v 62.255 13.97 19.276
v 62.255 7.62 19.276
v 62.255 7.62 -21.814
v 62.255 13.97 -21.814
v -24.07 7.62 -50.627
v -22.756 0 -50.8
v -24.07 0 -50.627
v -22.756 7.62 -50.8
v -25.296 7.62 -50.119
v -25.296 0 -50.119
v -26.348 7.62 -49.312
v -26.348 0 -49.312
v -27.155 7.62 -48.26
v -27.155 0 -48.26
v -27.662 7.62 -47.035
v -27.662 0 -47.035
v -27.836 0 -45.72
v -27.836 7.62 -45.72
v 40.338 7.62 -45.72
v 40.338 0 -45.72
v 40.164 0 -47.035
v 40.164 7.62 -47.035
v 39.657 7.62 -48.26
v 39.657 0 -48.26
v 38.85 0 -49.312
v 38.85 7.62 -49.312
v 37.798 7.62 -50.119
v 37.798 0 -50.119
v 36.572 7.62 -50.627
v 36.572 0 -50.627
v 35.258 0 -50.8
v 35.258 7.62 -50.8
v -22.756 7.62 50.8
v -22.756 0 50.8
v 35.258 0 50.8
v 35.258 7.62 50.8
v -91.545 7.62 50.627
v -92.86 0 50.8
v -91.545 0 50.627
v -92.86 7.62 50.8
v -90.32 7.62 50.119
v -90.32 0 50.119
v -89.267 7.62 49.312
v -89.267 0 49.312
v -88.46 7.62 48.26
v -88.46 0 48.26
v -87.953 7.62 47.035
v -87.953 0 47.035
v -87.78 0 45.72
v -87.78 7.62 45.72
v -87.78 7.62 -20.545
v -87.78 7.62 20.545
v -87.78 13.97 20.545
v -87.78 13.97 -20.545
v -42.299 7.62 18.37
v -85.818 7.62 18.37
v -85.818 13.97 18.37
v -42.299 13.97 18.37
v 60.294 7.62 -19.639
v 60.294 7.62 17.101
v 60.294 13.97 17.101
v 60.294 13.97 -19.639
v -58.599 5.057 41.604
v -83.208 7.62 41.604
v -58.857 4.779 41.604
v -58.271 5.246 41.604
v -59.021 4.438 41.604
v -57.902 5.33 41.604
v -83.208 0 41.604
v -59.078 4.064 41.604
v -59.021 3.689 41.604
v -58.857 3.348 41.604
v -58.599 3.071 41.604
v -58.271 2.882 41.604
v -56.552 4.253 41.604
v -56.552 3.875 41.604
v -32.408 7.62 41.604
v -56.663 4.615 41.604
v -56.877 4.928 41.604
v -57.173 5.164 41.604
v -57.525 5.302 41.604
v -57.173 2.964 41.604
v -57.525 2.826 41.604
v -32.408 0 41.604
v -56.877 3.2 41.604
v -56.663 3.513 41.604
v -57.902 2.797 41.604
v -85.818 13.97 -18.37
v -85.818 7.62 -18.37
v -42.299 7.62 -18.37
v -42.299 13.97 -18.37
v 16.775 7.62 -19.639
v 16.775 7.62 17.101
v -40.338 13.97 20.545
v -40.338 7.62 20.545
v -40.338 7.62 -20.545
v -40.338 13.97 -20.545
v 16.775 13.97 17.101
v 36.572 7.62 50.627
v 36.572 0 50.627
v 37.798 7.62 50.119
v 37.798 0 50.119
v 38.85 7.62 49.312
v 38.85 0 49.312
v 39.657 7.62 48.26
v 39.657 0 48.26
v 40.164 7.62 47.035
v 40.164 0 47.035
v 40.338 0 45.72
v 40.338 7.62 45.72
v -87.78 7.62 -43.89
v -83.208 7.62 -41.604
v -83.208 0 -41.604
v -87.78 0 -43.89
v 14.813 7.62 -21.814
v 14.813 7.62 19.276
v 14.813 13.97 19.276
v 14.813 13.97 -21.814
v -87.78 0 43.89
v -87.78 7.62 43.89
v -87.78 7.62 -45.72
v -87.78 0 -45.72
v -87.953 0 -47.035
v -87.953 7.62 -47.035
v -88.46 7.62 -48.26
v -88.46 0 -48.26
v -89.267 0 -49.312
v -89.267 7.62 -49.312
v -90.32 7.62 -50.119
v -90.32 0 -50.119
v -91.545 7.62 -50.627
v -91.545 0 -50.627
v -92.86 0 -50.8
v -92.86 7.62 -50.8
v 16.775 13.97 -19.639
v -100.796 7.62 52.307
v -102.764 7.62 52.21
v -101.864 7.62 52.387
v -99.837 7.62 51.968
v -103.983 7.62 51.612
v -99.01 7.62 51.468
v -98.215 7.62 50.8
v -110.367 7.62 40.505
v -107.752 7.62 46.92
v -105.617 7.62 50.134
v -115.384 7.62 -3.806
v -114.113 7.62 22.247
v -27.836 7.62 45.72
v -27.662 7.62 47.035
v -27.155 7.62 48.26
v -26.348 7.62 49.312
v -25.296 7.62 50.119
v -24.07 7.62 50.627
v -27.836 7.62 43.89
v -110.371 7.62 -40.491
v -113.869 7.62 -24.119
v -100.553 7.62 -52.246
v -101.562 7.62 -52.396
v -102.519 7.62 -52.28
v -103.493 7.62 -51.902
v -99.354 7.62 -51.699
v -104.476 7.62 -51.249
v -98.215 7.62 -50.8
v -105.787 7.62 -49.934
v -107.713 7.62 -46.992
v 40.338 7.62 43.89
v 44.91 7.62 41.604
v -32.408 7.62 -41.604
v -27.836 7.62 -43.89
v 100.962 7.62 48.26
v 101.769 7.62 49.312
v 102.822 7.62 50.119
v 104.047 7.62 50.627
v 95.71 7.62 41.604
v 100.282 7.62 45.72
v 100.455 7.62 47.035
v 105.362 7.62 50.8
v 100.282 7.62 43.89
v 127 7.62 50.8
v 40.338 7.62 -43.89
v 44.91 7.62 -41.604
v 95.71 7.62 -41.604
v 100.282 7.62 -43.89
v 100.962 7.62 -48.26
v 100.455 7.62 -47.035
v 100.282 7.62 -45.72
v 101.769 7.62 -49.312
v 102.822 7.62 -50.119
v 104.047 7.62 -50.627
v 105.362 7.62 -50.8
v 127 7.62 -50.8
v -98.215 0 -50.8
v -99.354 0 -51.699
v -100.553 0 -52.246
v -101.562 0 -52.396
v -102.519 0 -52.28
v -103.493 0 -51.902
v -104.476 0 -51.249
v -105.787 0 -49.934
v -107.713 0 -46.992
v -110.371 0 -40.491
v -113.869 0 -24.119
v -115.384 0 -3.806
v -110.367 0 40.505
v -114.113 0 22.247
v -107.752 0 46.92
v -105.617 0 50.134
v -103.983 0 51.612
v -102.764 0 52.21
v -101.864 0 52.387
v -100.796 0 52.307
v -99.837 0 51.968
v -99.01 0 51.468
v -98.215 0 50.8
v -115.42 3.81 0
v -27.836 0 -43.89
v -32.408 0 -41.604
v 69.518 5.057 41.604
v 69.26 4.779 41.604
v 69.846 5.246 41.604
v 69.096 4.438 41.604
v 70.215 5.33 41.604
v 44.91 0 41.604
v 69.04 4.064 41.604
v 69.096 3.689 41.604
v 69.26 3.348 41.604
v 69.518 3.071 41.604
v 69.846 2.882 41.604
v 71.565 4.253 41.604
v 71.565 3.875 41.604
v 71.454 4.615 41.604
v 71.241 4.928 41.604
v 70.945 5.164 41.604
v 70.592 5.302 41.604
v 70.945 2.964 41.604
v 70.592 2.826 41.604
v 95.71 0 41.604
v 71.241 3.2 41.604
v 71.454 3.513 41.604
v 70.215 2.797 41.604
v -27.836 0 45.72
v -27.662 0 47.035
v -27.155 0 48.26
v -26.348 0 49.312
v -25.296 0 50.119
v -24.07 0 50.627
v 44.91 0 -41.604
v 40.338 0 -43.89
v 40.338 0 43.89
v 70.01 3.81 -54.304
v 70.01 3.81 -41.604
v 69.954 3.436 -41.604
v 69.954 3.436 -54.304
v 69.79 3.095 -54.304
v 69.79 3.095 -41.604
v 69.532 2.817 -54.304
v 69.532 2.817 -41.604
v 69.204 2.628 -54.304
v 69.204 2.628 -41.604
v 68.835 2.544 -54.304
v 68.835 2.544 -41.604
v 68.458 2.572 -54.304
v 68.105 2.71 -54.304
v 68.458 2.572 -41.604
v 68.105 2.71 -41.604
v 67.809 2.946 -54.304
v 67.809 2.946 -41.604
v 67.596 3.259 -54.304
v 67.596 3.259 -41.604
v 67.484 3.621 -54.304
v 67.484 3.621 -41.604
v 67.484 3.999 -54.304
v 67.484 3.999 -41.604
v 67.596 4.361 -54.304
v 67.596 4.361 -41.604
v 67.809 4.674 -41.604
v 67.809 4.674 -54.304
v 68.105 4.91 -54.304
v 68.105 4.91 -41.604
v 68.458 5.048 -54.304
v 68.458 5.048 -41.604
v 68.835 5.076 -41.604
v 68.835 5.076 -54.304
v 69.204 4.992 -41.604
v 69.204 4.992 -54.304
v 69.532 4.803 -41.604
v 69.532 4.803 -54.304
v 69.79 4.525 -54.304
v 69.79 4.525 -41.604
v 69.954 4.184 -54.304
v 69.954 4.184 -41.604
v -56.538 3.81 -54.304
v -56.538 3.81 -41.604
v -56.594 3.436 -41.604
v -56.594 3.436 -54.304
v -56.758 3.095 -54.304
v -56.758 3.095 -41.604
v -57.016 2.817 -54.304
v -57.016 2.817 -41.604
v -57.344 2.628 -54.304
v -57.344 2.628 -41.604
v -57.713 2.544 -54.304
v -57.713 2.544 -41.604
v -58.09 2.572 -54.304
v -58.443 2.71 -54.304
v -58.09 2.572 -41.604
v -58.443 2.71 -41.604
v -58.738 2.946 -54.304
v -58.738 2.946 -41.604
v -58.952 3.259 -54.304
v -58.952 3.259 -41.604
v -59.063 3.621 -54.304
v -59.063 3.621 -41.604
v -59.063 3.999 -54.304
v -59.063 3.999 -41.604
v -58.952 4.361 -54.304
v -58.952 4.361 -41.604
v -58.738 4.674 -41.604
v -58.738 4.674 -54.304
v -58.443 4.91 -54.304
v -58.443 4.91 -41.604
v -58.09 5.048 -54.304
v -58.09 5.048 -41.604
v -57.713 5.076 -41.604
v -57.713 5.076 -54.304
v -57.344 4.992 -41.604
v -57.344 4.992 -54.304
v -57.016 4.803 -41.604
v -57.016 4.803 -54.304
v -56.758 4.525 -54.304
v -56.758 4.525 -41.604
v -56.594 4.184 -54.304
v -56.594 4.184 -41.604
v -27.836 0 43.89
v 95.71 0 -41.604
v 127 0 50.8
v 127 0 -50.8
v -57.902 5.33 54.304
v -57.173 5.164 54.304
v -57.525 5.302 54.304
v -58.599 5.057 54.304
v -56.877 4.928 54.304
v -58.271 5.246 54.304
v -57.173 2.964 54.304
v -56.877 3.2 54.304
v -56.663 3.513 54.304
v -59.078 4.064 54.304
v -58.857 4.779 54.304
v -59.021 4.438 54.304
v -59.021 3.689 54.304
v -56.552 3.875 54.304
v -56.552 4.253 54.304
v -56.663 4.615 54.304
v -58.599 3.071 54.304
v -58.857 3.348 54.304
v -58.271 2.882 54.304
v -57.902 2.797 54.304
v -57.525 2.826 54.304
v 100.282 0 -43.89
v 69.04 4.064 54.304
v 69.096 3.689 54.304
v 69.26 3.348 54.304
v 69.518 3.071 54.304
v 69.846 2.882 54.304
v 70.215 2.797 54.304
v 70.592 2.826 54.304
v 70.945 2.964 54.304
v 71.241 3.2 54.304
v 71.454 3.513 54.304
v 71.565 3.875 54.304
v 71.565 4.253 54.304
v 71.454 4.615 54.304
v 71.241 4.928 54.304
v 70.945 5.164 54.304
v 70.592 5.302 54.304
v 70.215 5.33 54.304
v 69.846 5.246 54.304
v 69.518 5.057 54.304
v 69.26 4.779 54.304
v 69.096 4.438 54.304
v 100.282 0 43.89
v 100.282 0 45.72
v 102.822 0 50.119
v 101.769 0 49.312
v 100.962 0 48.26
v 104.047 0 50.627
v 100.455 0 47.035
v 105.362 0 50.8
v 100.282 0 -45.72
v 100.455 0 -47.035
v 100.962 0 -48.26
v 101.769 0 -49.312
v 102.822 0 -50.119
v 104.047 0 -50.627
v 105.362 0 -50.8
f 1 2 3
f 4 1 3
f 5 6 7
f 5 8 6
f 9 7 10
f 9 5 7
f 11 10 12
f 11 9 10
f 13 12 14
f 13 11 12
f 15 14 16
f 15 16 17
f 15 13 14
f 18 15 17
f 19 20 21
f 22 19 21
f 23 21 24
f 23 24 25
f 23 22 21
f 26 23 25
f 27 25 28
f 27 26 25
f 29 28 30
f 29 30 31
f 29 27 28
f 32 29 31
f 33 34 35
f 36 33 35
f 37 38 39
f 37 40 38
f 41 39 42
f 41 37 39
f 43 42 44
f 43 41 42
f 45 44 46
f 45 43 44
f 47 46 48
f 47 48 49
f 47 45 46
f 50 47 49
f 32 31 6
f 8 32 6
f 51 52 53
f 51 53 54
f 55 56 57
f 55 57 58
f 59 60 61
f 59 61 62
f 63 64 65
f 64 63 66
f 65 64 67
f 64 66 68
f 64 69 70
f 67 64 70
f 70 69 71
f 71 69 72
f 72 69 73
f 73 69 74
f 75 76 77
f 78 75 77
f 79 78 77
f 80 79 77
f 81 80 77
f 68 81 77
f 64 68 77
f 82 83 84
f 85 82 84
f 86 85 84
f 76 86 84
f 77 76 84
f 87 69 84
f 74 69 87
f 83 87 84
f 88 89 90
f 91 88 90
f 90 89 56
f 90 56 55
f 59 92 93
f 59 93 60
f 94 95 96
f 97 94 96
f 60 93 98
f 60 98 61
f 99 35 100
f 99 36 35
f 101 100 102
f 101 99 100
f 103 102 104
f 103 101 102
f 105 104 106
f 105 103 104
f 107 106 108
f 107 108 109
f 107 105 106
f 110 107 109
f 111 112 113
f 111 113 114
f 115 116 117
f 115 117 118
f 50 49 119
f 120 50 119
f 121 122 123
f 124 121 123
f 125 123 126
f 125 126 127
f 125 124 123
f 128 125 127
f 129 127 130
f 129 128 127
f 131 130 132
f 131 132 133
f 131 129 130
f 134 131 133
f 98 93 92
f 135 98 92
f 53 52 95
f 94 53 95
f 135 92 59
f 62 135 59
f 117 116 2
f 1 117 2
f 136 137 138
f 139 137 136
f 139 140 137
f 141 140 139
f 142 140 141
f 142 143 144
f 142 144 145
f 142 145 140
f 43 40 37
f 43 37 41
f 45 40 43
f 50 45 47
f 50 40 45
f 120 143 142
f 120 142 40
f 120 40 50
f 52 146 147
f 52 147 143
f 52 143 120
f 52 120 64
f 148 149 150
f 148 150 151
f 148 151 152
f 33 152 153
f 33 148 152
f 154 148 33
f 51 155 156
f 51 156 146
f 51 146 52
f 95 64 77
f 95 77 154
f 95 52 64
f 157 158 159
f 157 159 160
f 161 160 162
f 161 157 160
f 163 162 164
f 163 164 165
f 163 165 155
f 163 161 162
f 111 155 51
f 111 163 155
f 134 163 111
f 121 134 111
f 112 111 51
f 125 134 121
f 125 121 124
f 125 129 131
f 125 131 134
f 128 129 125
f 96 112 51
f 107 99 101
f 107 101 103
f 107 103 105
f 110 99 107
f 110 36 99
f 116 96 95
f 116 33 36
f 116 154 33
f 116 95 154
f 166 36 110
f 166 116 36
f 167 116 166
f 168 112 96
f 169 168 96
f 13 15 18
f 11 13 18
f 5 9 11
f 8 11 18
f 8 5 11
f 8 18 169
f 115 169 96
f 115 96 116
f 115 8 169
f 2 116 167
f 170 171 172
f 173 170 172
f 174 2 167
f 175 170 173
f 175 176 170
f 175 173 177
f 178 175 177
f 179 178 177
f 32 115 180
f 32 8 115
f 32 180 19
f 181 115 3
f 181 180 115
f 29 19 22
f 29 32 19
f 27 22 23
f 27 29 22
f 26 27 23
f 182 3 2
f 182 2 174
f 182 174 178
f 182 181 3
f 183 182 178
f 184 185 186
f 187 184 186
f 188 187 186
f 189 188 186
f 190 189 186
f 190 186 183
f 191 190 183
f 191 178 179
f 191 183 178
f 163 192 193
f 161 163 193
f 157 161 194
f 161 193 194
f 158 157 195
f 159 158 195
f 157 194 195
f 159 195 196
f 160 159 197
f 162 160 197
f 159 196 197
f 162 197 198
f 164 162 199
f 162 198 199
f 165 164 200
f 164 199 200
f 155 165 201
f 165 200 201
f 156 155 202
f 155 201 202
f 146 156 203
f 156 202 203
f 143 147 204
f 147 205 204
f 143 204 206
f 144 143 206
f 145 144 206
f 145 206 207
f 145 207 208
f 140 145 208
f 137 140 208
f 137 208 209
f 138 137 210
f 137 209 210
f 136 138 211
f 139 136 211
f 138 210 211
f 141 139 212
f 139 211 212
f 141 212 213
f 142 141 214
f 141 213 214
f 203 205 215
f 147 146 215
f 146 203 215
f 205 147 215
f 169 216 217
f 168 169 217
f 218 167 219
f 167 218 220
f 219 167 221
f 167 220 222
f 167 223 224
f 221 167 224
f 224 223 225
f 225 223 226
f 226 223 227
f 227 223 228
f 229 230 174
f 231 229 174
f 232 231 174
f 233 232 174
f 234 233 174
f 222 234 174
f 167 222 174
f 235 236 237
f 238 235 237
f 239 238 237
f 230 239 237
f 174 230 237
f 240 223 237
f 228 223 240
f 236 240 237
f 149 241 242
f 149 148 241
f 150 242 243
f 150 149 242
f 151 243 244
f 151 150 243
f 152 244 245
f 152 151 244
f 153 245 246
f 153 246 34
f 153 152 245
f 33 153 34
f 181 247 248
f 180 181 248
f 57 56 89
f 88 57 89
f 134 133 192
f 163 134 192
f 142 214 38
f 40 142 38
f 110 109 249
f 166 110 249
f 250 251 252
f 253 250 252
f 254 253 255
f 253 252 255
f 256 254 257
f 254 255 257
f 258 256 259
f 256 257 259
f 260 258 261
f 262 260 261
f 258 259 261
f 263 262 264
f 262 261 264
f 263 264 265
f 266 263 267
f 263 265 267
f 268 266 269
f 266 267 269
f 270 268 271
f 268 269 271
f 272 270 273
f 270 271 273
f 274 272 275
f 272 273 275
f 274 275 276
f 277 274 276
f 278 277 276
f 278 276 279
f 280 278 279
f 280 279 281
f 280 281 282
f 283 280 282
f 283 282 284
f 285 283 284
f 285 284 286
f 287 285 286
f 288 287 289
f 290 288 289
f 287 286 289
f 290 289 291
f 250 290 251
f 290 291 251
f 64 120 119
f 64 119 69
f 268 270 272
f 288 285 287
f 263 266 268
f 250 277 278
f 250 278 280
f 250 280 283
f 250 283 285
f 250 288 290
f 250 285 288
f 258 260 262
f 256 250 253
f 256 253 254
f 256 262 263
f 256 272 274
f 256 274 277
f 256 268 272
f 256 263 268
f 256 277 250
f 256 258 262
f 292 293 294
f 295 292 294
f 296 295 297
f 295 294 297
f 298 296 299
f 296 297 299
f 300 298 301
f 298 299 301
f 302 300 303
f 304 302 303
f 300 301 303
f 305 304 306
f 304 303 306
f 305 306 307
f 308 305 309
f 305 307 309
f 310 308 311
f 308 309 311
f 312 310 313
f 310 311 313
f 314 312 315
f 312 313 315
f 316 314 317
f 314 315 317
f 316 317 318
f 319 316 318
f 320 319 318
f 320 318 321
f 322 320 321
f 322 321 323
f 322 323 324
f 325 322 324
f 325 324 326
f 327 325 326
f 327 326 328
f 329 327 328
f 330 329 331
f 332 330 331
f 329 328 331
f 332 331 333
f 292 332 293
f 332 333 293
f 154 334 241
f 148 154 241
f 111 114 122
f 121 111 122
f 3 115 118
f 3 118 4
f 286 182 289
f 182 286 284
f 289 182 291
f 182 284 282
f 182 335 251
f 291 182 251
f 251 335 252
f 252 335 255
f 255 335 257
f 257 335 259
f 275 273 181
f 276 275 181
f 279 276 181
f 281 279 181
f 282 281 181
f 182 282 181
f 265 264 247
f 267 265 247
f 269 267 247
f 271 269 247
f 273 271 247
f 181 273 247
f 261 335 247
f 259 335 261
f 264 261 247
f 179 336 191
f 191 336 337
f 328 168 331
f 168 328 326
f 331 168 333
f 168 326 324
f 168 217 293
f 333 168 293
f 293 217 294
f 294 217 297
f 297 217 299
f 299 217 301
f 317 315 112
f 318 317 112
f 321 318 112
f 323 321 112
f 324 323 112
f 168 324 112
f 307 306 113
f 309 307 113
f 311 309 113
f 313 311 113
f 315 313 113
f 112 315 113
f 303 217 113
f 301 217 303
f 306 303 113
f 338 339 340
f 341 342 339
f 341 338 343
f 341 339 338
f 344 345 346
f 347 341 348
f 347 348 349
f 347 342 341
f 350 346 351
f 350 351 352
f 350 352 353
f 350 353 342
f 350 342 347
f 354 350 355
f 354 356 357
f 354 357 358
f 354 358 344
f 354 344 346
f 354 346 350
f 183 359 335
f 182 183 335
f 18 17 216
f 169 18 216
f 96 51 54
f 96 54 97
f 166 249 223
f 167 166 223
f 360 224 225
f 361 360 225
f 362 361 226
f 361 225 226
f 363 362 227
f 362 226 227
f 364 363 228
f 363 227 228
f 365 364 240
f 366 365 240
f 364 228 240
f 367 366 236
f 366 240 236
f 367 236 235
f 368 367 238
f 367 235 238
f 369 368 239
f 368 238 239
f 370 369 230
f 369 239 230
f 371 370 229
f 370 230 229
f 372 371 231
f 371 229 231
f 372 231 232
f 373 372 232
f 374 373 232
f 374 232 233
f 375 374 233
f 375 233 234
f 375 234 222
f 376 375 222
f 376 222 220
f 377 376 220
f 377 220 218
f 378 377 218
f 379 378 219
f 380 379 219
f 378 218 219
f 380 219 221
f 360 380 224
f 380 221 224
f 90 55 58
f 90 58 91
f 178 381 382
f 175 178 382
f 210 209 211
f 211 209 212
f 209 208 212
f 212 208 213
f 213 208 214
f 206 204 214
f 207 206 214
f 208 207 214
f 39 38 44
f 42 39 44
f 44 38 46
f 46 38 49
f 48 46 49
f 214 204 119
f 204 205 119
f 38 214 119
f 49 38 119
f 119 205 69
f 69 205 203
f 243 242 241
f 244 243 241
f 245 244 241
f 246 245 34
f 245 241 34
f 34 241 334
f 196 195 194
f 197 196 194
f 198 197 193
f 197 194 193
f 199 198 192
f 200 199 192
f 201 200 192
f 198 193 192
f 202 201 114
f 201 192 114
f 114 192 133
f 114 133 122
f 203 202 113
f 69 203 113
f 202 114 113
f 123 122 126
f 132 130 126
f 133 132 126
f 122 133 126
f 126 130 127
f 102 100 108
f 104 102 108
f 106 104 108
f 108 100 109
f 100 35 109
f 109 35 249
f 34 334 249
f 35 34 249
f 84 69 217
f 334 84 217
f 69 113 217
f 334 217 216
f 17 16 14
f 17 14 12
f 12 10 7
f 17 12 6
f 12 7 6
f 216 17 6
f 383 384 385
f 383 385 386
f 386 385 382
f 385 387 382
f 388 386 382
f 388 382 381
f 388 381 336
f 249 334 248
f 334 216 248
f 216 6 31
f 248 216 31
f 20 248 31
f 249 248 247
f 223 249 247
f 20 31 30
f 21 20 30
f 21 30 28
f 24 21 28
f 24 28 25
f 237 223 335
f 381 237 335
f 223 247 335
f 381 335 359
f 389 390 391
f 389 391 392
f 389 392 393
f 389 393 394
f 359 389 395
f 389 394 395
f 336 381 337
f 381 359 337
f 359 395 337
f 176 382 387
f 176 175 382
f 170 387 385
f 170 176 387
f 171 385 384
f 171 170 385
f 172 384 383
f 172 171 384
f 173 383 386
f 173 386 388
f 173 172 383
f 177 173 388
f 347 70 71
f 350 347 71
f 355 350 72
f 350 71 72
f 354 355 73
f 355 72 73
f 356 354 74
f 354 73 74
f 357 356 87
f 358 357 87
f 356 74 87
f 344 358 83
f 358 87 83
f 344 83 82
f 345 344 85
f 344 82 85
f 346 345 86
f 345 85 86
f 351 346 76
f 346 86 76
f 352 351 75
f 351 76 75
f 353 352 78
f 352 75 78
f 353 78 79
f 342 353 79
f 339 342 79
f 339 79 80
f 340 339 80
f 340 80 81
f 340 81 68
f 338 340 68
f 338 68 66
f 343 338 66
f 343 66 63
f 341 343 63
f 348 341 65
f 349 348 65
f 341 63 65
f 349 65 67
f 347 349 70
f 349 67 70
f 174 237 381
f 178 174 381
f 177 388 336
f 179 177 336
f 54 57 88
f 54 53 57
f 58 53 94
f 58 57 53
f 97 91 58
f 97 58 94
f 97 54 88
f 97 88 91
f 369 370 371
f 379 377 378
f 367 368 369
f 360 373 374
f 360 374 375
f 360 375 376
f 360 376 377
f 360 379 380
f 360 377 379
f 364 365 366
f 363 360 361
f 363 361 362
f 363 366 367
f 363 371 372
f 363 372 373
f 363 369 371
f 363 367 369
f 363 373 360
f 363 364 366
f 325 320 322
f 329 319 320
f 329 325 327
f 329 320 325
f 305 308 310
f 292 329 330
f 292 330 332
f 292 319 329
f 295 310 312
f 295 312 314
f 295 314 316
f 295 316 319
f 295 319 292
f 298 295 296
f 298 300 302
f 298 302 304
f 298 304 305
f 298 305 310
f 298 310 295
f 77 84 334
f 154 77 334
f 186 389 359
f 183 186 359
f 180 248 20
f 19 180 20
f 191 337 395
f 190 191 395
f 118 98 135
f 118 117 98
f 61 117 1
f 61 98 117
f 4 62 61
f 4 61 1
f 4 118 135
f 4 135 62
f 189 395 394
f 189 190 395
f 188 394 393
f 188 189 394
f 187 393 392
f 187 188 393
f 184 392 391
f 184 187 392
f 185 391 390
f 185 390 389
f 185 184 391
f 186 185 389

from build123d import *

# Parameters (mm, degrees)
BOSS_EXTRUDE1_DEPTH = 7.62
SKETCH3_R           = 1.27
BOSS_EXTRUDE4_DEPTH = 12.7
SKETCH4_R           = 1.27
BOSS_EXTRUDE5_DEPTH = 12.7
SKETCH5_W           = 47.441949355
SKETCH5_H           = 41.090366136
SKETCH5_W_2         = 43.519244155
SKETCH5_H_2         = 36.739621486
BOSS_EXTRUDE7_DEPTH = 6.35
FILLET12_R          = 5.08


with BuildPart() as part:
    # Sketch1 → Boss-Extrude1 (new body)
    with BuildSketch(Plane(origin=(0, 0, 0), x_dir=(1, 0, 0), z_dir=(0, 1, 0))):
        with BuildLine():
            Line((-87.779503071, 43.889751536), (-87.779503071, 50.8))
            Line((-87.779503071, 50.8), (-98.214639932, 50.8))
            add(Edge.make_bspline(
                [(-98.214639932, 50.8), (-115.420496929, 67.280501768), (-115.420496929, 0), (-115.420496929, -67.280501768), (-98.214639932, -50.8)],
                knots=[2.894122342, 2.894122342, 2.894122342, 4.71238898, 4.71238898, 6.530655618, 6.530655618, 6.530655618], degree=2, weights=[1, 0.614429767, 1, 0.614429767, 1]))
            Line((-98.214639932, -50.8), (-87.779503071, -50.8))
            Line((-87.779503071, -50.8), (-87.779503071, -43.889751536))
            Line((-87.779503071, -43.889751536), (-83.207503071, -41.603751536))
            Line((-83.207503071, -41.603751536), (-32.407503071, -41.603751536))
            Line((-32.407503071, -41.603751536), (-27.835503071, -43.889751536))
            Line((-27.835503071, -43.889751536), (-27.835503071, -50.8))
            Line((-27.835503071, -50.8), (40.337553716, -50.8))
            Line((40.337553716, -50.8), (40.337553716, -43.889751536))
            Line((40.337553716, -43.889751536), (44.909553716, -41.603751536))
            Line((44.909553716, -41.603751536), (95.709553716, -41.603751536))
            Line((95.709553716, -41.603751536), (100.281553716, -43.889751536))
            Line((100.281553716, -43.889751536), (100.281553716, -50.8))
            Line((100.281553716, -50.8), (127, -50.8))
            Line((127, -50.8), (127, 50.8))
            Line((127, 50.8), (100.281553716, 50.8))
            Line((100.281553716, 50.8), (100.281553716, 43.889751536))
            Line((100.281553716, 43.889751536), (95.709553716, 41.603751536))
            Line((95.709553716, 41.603751536), (44.909553716, 41.603751536))
            Line((44.909553716, 41.603751536), (40.337553716, 43.889751536))
            Line((40.337553716, 43.889751536), (40.337553716, 50.8))
            Line((40.337553716, 50.8), (-27.835503071, 50.8))
            Line((-27.835503071, 50.8), (-27.835503071, 43.889751536))
            Line((-27.835503071, 43.889751536), (-32.407503071, 41.603751536))
            Line((-32.407503071, 41.603751536), (-83.207503071, 41.603751536))
            Line((-83.207503071, 41.603751536), (-87.779503071, 43.889751536))
        make_face()
    extrude(amount=BOSS_EXTRUDE1_DEPTH)

    # Sketch3 → Boss-Extrude4 (add)
    with BuildSketch(Plane.XY.offset(41.603751536)):
        with Locations(Location((-57.807503071, 4.063832654, 0), (0, 0, 180))):
            Circle(SKETCH3_R)
        with Locations(Location((70.309553716, 4.063832654, 0), (0, 0, 180))):
            Circle(SKETCH3_R)
    extrude(amount=BOSS_EXTRUDE4_DEPTH)

    # Sketch4 → Boss-Extrude5 (add)
    with BuildSketch(Plane(origin=(0, 0, -41.603751536), x_dir=(-1, 0, 0), z_dir=(0, 0, -1))):
        with Locations(Location((-68.740249833, 3.81, 0), (0, 0, 180))):
            Circle(SKETCH4_R)
        with Locations(Location((57.807503071, 3.81, 0), (0, 0, 180))):
            Circle(SKETCH4_R)
    extrude(amount=BOSS_EXTRUDE5_DEPTH)

    # Sketch5 → Boss-Extrude7 (add)
    # profile 1 of 2: a face of its own
    with BuildSketch(Plane(origin=(0, 7.62, 0), x_dir=(1, 0, 0), z_dir=(0, 1, 0))):
        with Locations((-64.058528394, 0)):
            Rectangle(SKETCH5_W, SKETCH5_H)
        with Locations((-64.058528394, 0)):
            Rectangle(SKETCH5_W_2, SKETCH5_H_2, mode=Mode.SUBTRACT)
    # profile 2 of 2: a face of its own
    with BuildSketch(Plane(origin=(0, 7.62, 0), x_dir=(1, 0, 0), z_dir=(0, 1, 0))):
        with Locations((38.534163957, 1.269163272)):
            Rectangle(SKETCH5_W, SKETCH5_H)
        with Locations((38.534163957, 1.269163272)):
            Rectangle(SKETCH5_W_2, SKETCH5_H_2, mode=Mode.SUBTRACT)
    extrude(amount=BOSS_EXTRUDE7_DEPTH)

    # Fillet12
    fillet12_edges = [part.edges().sort_by_distance(p)[0] for p in [
        (-87.779503071, 3.81, -50.8),
        (-27.835503071, 3.81, -50.8),
        (40.337553716, 3.81, -50.8),
        (100.281553716, 3.81, -50.8),
        (100.281553716, 3.81, 50.8),
        (40.337553716, 3.81, 50.8),
        (-27.835503071, 3.81, 50.8),
        (-87.779503071, 3.81, 50.8),
    ]]
    fillet(fillet12_edges, radius=FILLET12_R)


solid = part.part
